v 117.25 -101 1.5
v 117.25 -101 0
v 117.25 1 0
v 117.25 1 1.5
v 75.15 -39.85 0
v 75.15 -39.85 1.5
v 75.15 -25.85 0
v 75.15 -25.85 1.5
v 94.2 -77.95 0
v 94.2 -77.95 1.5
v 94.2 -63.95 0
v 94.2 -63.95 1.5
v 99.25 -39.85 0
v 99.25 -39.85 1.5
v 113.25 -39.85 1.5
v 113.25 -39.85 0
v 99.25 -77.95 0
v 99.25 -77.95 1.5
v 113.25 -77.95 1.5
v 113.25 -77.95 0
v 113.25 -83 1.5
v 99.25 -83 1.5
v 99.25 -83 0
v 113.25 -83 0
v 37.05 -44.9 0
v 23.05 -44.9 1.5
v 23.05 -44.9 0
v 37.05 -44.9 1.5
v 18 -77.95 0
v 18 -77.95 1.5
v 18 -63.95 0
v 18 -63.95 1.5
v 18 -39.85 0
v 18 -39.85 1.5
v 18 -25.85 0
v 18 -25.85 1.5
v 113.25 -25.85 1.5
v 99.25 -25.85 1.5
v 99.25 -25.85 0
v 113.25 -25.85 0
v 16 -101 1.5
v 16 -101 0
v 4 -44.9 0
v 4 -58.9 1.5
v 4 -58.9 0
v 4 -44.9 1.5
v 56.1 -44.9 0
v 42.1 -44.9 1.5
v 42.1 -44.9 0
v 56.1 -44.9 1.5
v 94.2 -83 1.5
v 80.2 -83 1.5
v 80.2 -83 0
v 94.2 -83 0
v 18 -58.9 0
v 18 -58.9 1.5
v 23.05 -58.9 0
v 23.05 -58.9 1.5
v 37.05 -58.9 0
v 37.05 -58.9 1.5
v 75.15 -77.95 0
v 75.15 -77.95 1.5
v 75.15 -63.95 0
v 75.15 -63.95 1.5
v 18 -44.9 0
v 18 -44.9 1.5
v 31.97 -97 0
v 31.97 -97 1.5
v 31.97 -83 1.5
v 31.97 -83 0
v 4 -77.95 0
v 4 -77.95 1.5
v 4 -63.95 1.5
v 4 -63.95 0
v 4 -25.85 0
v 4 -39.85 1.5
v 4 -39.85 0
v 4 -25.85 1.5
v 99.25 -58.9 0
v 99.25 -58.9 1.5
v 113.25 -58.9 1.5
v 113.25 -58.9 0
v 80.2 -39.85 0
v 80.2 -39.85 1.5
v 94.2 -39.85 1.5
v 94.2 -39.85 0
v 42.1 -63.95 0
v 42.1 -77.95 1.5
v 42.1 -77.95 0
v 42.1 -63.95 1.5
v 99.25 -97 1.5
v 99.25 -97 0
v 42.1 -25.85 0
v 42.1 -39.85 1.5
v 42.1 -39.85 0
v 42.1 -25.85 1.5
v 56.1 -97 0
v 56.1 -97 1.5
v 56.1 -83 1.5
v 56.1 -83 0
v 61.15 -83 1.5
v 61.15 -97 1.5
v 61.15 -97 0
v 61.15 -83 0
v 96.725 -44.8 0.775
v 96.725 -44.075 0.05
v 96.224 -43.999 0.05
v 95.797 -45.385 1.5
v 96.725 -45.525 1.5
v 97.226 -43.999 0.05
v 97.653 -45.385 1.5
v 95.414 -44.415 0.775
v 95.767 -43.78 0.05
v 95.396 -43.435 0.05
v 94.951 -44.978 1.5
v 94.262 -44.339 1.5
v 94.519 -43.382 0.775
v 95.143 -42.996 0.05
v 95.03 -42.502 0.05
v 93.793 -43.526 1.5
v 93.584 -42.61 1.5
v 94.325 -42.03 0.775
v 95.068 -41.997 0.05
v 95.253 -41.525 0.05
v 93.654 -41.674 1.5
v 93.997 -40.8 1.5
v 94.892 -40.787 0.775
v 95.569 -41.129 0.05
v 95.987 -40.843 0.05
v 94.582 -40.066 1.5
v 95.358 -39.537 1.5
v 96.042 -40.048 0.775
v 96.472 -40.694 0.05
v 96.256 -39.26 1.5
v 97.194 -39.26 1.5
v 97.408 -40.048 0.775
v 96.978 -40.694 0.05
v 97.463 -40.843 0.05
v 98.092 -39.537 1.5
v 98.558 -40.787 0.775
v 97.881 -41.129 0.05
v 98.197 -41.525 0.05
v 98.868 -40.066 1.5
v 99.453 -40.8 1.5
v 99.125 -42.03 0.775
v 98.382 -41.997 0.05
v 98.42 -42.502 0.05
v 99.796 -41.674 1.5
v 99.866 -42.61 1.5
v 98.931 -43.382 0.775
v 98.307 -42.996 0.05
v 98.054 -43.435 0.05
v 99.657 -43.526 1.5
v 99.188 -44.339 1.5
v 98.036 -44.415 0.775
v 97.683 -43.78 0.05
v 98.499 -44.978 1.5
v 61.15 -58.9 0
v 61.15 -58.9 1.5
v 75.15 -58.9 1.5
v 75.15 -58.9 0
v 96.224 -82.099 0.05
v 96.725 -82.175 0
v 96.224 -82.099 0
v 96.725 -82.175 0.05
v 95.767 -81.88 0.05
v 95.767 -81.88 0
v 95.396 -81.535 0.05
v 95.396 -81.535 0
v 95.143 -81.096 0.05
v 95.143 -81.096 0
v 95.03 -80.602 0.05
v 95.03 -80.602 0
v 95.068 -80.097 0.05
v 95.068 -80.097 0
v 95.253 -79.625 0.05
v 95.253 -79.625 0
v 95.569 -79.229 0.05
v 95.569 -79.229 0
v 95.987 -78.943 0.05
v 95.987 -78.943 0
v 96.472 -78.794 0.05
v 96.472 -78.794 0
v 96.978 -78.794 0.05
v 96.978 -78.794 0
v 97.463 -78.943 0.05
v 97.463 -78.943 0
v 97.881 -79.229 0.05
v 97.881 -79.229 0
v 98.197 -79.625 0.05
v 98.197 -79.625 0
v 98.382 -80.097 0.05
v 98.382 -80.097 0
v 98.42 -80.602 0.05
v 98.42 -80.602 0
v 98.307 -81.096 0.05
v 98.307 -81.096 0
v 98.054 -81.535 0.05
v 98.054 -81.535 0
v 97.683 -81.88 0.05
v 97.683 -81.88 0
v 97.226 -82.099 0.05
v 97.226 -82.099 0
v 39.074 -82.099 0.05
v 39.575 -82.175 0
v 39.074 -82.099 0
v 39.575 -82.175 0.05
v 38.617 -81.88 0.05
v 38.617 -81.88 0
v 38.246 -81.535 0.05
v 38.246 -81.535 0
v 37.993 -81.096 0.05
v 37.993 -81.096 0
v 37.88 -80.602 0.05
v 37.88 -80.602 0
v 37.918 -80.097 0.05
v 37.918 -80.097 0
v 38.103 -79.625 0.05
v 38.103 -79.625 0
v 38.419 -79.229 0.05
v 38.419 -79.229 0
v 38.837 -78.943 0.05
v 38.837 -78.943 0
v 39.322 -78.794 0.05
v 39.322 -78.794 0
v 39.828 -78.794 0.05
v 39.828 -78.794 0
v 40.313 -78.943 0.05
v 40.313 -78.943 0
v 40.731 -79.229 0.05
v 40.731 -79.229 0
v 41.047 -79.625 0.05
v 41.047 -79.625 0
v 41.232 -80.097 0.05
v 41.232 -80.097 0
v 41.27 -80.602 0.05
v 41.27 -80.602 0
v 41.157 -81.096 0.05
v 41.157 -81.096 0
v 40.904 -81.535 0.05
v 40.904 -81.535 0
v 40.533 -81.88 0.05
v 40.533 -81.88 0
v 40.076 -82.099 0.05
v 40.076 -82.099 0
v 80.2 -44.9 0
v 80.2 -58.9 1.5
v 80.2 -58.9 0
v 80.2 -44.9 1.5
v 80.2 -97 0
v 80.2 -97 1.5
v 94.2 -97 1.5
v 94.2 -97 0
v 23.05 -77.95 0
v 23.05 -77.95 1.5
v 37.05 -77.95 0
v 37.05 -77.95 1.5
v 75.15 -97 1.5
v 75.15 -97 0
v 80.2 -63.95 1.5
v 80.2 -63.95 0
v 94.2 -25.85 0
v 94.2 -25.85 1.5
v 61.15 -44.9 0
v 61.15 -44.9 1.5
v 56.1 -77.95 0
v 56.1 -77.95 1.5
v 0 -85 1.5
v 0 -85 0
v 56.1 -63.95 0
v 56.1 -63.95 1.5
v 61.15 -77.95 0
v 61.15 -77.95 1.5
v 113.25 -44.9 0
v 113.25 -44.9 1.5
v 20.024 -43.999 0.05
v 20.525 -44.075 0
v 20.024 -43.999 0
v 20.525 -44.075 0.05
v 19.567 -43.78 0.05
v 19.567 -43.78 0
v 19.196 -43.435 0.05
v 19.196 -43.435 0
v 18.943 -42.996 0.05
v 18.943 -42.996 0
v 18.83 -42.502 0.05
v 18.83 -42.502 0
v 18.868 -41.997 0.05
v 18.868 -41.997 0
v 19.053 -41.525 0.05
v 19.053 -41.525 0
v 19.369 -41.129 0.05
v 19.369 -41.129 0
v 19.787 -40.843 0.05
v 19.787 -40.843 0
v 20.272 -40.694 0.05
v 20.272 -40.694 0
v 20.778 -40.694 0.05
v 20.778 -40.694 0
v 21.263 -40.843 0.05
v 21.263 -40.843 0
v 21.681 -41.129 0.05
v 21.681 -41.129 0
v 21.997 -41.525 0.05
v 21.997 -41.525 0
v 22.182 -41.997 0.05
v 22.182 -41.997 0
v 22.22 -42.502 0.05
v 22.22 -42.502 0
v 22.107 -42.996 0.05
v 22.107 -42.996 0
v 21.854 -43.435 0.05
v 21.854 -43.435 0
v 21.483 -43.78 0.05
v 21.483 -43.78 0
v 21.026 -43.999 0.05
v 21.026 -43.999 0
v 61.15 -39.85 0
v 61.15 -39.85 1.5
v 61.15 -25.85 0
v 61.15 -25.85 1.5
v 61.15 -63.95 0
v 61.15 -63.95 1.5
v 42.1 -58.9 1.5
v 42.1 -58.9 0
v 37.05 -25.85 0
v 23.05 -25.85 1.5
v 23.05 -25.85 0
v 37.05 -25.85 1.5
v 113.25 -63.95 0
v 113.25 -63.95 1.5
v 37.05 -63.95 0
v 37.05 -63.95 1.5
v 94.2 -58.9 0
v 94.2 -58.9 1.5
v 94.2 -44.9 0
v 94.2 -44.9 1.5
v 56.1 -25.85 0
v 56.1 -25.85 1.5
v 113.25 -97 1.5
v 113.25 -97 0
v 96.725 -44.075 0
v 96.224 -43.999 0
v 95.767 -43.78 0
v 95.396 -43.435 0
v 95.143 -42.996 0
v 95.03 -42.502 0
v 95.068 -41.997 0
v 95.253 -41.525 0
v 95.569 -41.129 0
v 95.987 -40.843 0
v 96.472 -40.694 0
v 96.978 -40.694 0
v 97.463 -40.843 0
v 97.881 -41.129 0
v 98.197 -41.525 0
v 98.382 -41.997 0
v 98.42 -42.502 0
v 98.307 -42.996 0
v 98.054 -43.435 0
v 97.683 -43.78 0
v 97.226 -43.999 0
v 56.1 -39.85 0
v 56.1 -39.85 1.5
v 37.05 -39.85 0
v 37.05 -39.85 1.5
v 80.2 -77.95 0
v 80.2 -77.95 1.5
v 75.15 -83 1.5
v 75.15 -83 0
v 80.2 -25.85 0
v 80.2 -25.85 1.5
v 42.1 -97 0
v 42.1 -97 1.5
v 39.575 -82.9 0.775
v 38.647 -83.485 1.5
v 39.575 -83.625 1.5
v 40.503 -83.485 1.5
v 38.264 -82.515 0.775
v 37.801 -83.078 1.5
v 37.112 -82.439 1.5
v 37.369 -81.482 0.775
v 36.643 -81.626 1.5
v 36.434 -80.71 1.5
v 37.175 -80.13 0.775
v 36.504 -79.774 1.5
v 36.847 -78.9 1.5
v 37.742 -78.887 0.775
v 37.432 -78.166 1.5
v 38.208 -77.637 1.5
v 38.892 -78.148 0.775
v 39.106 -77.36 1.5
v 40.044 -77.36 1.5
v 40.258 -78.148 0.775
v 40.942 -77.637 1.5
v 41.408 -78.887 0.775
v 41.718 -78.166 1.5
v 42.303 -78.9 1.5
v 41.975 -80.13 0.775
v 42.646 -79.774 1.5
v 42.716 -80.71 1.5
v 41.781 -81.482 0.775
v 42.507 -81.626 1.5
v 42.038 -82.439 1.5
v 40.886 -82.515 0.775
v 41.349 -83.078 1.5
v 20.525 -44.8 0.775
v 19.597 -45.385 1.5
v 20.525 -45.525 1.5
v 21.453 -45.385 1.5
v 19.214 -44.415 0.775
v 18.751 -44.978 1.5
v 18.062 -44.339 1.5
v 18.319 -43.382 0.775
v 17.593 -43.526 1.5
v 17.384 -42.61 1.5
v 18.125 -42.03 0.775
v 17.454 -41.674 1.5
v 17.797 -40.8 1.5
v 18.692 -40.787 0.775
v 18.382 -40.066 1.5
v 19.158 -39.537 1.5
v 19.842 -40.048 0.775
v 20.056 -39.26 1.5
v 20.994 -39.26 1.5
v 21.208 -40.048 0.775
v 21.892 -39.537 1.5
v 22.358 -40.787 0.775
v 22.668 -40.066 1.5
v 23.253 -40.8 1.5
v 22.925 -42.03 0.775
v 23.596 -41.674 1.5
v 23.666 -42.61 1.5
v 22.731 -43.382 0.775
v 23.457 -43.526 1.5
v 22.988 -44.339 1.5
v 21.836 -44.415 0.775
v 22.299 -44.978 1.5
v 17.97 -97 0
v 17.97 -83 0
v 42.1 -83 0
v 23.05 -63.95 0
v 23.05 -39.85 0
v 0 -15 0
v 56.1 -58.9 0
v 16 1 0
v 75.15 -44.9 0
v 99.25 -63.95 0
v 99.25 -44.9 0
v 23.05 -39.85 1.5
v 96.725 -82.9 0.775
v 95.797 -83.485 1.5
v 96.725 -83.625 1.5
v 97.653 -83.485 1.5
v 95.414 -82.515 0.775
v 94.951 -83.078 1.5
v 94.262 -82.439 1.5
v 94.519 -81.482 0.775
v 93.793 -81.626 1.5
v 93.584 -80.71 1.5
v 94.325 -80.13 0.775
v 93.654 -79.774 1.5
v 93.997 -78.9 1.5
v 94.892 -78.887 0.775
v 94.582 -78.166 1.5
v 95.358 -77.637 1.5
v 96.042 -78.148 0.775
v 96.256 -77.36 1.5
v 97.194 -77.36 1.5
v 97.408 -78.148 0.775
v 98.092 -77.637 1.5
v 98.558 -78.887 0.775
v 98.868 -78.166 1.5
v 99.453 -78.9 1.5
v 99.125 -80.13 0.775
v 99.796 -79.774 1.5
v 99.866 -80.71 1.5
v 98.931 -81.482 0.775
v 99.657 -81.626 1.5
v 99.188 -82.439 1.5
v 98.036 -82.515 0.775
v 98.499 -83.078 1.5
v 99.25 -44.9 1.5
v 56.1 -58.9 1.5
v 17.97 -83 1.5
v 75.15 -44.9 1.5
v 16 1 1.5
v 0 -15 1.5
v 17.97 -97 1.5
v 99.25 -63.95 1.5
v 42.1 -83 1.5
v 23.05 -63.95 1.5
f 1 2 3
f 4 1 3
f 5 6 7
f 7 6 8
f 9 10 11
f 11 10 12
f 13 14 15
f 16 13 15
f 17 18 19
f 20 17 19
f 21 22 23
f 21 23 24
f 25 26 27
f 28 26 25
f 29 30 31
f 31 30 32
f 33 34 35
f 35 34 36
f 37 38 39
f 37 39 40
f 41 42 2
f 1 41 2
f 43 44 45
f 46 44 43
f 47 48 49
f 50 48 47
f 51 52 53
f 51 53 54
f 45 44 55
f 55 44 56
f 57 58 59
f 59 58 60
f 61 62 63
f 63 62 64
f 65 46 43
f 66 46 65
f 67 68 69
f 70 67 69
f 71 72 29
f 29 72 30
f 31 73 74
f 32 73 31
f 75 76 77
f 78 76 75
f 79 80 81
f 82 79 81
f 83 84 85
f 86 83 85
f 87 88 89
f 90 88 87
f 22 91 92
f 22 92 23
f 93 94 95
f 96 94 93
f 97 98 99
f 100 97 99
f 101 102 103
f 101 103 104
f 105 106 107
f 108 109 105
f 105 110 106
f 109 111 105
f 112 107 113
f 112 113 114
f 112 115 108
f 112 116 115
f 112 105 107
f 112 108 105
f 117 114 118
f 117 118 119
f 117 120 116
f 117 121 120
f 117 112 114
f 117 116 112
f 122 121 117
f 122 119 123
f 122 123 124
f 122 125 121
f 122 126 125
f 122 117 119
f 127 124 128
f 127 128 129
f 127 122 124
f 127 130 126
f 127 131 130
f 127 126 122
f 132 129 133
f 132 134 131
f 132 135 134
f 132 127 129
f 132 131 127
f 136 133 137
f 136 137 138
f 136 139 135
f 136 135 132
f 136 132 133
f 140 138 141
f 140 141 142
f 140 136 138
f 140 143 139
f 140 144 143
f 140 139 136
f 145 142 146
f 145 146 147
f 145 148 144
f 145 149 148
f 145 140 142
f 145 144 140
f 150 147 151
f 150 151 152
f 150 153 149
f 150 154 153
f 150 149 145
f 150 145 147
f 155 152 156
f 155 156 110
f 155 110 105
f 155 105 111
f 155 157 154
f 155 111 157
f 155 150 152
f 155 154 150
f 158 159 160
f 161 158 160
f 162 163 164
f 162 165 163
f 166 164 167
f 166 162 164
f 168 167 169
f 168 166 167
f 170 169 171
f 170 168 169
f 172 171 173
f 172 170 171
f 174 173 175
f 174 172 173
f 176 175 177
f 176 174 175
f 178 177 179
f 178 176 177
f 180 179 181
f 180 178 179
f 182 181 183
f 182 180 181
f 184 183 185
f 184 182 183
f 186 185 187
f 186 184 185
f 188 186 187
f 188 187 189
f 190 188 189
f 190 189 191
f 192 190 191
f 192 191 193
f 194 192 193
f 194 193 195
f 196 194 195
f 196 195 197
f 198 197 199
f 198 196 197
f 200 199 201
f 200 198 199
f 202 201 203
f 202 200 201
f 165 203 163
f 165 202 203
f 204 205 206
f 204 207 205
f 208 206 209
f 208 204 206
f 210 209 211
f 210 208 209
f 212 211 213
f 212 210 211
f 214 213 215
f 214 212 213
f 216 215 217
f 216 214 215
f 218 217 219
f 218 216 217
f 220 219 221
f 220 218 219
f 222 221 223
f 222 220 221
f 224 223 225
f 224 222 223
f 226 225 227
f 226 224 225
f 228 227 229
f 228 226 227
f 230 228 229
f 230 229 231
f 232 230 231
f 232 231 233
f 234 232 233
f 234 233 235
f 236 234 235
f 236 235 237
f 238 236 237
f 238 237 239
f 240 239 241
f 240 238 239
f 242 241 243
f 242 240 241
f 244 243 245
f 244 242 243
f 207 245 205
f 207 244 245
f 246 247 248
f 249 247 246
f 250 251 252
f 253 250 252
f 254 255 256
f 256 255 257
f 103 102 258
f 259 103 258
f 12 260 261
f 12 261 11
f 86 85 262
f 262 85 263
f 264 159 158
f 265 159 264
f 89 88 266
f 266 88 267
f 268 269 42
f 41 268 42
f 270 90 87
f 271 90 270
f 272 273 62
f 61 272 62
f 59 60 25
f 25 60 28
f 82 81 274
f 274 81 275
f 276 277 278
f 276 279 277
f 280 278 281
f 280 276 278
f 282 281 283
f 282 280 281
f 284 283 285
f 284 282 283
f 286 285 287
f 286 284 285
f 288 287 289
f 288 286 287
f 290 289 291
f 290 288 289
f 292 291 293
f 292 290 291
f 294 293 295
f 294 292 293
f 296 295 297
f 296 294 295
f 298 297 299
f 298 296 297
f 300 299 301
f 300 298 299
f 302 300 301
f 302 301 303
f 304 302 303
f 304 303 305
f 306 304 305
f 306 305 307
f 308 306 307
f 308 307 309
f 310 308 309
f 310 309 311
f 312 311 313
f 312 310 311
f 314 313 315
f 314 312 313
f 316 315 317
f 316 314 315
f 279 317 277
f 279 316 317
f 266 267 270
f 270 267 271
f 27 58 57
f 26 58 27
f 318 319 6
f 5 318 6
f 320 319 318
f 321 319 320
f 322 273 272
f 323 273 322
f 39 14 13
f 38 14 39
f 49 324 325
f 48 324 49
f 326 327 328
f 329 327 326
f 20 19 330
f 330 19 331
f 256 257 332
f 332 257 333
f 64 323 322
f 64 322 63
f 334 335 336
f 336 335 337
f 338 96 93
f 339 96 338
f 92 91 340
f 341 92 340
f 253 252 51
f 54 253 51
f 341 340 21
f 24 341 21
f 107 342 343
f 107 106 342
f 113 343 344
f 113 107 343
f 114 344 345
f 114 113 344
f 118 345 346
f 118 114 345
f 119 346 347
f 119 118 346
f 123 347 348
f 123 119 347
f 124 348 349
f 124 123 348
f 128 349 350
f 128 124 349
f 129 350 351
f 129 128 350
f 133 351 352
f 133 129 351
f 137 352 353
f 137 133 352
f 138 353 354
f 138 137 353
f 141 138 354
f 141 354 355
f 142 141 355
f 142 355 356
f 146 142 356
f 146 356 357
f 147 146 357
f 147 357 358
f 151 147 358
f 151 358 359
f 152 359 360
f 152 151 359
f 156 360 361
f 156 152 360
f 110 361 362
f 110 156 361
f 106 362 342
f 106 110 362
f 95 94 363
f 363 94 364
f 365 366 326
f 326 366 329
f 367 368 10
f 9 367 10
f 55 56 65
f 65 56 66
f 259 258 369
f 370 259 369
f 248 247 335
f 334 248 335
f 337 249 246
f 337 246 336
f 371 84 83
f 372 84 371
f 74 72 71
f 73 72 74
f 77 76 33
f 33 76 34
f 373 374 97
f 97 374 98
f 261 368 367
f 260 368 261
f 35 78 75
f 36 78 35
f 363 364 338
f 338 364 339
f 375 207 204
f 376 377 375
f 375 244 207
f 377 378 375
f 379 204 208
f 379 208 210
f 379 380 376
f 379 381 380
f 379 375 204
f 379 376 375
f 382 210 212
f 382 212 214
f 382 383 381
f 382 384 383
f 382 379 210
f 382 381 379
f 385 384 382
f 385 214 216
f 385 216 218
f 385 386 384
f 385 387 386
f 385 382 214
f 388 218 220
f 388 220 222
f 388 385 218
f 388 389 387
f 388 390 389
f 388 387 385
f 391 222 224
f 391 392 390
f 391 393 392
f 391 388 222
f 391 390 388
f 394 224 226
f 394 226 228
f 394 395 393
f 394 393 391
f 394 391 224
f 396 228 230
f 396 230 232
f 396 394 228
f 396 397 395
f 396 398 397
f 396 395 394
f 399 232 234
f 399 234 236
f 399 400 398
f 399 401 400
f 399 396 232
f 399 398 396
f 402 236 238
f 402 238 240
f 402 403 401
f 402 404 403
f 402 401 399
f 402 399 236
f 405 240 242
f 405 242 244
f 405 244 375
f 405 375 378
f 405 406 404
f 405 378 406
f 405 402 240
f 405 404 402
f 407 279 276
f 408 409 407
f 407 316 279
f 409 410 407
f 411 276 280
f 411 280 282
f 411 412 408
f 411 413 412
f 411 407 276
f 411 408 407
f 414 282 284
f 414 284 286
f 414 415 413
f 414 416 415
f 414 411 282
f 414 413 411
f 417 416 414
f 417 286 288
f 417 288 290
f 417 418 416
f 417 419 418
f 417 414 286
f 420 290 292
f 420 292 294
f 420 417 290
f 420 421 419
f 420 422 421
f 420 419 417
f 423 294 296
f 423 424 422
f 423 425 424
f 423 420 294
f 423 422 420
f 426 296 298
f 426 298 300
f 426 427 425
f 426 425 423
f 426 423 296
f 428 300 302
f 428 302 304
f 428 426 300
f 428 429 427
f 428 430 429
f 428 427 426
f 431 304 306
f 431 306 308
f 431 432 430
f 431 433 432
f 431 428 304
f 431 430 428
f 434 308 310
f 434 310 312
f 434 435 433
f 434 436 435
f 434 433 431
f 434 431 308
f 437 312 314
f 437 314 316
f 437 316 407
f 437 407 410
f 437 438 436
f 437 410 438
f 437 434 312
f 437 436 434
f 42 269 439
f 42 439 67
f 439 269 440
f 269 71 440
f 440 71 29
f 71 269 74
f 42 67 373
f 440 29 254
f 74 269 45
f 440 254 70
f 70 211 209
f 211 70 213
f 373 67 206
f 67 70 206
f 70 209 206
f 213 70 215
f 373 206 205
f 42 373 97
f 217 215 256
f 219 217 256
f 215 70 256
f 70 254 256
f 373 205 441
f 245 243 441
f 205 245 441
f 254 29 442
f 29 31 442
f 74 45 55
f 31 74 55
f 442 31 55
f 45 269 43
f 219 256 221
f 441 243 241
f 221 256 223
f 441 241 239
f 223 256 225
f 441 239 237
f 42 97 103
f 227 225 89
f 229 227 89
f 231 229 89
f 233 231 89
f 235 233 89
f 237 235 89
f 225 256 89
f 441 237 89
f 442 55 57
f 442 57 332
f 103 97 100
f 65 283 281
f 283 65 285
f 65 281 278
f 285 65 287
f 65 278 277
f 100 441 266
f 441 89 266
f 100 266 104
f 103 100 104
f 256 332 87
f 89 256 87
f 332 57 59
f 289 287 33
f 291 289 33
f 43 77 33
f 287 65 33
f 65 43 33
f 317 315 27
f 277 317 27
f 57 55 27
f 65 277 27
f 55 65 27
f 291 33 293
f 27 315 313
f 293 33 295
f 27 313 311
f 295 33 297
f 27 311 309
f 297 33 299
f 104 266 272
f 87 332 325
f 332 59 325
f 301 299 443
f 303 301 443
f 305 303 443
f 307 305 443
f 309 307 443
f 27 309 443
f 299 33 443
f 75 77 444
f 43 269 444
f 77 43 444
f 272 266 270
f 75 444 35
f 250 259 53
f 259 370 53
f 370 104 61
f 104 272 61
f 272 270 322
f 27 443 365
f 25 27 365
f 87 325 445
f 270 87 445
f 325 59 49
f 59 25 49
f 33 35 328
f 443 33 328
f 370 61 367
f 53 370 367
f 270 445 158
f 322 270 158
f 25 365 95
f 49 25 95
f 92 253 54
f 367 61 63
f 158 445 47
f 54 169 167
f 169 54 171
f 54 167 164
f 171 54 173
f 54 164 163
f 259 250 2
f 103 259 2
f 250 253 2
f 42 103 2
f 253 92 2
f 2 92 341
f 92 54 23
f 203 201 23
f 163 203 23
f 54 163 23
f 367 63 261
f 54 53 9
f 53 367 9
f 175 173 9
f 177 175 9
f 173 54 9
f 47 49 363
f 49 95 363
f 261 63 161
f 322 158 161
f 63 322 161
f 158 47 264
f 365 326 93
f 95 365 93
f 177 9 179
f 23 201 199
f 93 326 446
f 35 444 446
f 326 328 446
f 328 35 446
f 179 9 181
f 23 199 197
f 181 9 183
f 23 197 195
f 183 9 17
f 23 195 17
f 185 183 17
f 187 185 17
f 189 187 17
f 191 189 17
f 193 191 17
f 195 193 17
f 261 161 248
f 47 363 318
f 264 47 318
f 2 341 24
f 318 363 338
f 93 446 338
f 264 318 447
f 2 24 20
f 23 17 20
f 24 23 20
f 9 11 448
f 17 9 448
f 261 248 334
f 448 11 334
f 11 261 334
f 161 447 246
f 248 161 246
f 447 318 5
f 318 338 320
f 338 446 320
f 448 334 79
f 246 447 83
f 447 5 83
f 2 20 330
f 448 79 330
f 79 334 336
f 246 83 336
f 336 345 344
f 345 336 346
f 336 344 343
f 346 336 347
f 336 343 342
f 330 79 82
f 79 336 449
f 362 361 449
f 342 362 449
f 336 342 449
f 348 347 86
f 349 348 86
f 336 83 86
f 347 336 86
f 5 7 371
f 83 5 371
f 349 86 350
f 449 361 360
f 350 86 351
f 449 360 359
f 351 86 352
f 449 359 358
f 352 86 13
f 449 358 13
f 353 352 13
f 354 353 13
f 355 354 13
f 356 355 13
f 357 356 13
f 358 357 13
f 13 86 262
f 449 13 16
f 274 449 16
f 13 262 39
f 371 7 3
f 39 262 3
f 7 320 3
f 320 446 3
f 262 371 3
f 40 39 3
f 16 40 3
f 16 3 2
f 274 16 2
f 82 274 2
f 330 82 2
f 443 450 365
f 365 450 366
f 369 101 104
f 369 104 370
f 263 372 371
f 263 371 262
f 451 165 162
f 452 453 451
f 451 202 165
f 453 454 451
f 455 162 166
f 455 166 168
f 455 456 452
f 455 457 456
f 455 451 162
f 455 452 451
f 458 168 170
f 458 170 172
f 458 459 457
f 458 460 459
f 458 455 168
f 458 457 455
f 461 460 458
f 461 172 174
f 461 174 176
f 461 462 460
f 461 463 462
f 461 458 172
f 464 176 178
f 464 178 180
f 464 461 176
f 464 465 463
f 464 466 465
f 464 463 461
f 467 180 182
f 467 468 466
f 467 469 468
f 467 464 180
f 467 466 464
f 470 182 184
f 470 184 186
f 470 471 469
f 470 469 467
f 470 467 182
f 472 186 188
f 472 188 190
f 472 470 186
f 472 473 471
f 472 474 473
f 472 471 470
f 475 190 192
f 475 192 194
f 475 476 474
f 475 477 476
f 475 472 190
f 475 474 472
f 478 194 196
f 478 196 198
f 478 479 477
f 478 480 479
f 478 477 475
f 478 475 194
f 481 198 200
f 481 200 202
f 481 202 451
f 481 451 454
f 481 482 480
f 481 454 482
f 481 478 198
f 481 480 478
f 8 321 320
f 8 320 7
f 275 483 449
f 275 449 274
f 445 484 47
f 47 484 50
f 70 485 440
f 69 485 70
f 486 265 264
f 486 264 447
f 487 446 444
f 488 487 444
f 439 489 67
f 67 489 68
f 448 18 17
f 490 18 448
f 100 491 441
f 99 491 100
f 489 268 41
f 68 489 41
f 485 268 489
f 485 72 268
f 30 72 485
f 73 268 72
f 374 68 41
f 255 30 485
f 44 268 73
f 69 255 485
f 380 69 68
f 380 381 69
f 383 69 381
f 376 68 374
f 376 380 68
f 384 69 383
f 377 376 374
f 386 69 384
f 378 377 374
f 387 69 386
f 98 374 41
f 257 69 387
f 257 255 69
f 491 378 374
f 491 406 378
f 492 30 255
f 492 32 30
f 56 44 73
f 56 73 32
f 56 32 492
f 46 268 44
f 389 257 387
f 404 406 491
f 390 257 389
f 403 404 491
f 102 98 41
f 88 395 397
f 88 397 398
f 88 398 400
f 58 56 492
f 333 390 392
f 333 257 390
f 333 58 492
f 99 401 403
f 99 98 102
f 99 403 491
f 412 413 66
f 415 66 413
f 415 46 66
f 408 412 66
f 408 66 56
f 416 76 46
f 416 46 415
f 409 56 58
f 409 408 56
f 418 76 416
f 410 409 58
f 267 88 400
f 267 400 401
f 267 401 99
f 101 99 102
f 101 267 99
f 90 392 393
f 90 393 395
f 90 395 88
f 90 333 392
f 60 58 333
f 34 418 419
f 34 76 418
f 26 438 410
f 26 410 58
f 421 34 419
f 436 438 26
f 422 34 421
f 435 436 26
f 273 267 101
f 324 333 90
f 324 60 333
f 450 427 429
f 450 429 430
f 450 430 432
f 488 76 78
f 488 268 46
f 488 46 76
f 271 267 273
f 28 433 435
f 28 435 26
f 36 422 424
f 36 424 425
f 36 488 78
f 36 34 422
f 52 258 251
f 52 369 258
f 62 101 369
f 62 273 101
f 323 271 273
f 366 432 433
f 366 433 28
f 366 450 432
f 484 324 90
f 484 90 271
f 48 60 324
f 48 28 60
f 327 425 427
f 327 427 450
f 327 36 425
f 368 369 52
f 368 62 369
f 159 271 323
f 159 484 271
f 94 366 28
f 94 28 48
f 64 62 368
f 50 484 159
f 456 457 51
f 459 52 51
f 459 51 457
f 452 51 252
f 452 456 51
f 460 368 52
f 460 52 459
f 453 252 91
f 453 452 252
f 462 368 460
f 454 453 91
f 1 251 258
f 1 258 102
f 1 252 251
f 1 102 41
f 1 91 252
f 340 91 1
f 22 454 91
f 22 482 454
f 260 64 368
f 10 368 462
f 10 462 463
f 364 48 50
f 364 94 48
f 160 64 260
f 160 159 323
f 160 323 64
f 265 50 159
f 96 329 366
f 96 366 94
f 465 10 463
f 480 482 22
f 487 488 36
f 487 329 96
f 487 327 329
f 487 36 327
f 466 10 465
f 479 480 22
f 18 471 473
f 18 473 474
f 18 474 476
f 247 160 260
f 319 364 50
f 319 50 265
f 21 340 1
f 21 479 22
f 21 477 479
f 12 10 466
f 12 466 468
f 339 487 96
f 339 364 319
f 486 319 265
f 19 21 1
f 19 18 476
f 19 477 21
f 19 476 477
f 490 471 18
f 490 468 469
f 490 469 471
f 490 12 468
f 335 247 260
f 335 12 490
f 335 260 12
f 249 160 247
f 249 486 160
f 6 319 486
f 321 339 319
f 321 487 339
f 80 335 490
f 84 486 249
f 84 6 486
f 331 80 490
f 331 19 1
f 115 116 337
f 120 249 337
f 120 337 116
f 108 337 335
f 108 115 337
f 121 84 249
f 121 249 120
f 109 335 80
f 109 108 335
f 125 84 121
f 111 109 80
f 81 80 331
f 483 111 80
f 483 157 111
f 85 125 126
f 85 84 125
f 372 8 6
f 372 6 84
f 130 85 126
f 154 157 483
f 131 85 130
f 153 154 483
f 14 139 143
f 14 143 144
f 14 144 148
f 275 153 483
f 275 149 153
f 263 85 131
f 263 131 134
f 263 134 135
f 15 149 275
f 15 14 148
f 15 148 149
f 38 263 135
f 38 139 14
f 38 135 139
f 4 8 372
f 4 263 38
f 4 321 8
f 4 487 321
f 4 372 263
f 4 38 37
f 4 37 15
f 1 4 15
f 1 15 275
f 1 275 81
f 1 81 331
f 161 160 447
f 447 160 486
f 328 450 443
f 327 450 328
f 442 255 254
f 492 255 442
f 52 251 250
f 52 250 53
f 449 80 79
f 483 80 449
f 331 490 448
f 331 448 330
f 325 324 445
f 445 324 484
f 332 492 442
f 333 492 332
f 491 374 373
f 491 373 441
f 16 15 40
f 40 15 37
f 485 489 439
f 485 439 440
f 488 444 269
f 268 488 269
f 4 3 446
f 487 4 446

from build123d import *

# Parameters (mm, degrees)
BOSS_EXTRU_1_DEPTH                          = 1.5
ESQUISSE2_W                                 = 14
ESQUISSE2_H                                 = 14
ENL_V_MAT_EXTRU_1_DEPTH                     = 1.5
FRAISAGE_POUR_VIS_T_TE_FRAIS_E_M31_AT_COUNT = 2
FRAISAGE_POUR_VIS_T_TE_FRAIS_E_M31_AT_PITCH = 76.2
FRAISAGE_POUR_VIS_T_TE_FRAIS_E_M31_2_COUNT  = 2
FRAISAGE_POUR_VIS_T_TE_FRAIS_E_M31_2_PITCH  = 85.194189943
FRAISAGE_POUR_VIS_T_TE_FRAIS_E_M31_3_COUNT  = 2
FRAISAGE_POUR_VIS_T_TE_FRAIS_E_M31_3_PITCH  = 42.597094971


with BuildPart() as part:
    # Esquisse1 → Boss.-Extru.1 (new body)
    with BuildSketch(Plane.XY):
        Polygon((0, -85), (16, -101), (117.25, -101), (117.25, 1), (16, 1), (0, -15), align=None)
    extrude(amount=BOSS_EXTRU_1_DEPTH)

    # Esquisse2 → Enlèv. mat.-Extru.1 (cut)
    with BuildSketch(Plane.XY.offset(1.5)):
        with Locations((11, -32.85)):
            Rectangle(ESQUISSE2_W, ESQUISSE2_H)
        with Locations((30.05, -32.85)):
            Rectangle(ESQUISSE2_W, ESQUISSE2_H)
        with Locations((49.1, -32.85)):
            Rectangle(ESQUISSE2_W, ESQUISSE2_H)
        with Locations((68.15, -32.85)):
            Rectangle(ESQUISSE2_W, ESQUISSE2_H)
        with Locations((87.2, -32.85)):
            Rectangle(ESQUISSE2_W, ESQUISSE2_H)
        with Locations((106.25, -32.85)):
            Rectangle(ESQUISSE2_W, ESQUISSE2_H)
        with Locations((30.05, -51.9)):
            Rectangle(ESQUISSE2_W, ESQUISSE2_H)
        with Locations((49.1, -51.9)):
            Rectangle(ESQUISSE2_W, ESQUISSE2_H)
        with Locations((68.15, -51.9)):
            Rectangle(ESQUISSE2_W, ESQUISSE2_H)
        with Locations((87.2, -51.9)):
            Rectangle(ESQUISSE2_W, ESQUISSE2_H)
        with Locations((106.25, -51.9)):
            Rectangle(ESQUISSE2_W, ESQUISSE2_H)
        with Locations((30.05, -70.95)):
            Rectangle(ESQUISSE2_W, ESQUISSE2_H)
        with Locations((49.1, -70.95)):
            Rectangle(ESQUISSE2_W, ESQUISSE2_H)
        with Locations((68.15, -70.95)):
            Rectangle(ESQUISSE2_W, ESQUISSE2_H)
        with Locations((87.2, -70.95)):
            Rectangle(ESQUISSE2_W, ESQUISSE2_H)
        with Locations((106.25, -70.95)):
            Rectangle(ESQUISSE2_W, ESQUISSE2_H)
        with Locations((11, -51.9)):
            Rectangle(ESQUISSE2_W, ESQUISSE2_H)
        with Locations((11, -70.95)):
            Rectangle(ESQUISSE2_W, ESQUISSE2_H)
        with Locations((49.1, -90)):
            Rectangle(ESQUISSE2_W, ESQUISSE2_H)
        with Locations((68.15, -90)):
            Rectangle(ESQUISSE2_W, ESQUISSE2_H)
        with Locations((87.2, -90)):
            Rectangle(ESQUISSE2_W, ESQUISSE2_H)
        with Locations((106.25, -90)):
            Rectangle(ESQUISSE2_W, ESQUISSE2_H)
        with Locations((24.97, -90)):
            Rectangle(ESQUISSE2_W, ESQUISSE2_H)
    extrude(amount=-ENL_V_MAT_EXTRU_1_DEPTH, mode=Mode.SUBTRACT)

    # Esquisse18 → Fraisage pour vis à tête fraisée M31 (revolve, cut)
    with BuildSketch(Plane(origin=(20.525, -42.375, 1.5), x_dir=(0, -1, 0), z_dir=(1, 0, 0))):
        Polygon((0, 0), (0, 1.5), (1.7, 1.5), (1.7, 1.45), (3.15, 0), align=None)
    fraisage_pour_vis_t_te_frais_e_m31 = revolve(axis=Axis((20.525, -42.375, 7.85), (0, 0, -1)), mode=Mode.SUBTRACT)

    # Fraisage pour vis à tête fraisée M31 at: Fraisage pour vis à tête fraisée M31 ×2
    with Locations(*[(i * FRAISAGE_POUR_VIS_T_TE_FRAIS_E_M31_AT_PITCH, 0, 0) for i in range(1, FRAISAGE_POUR_VIS_T_TE_FRAIS_E_M31_AT_COUNT)]):
        add(fraisage_pour_vis_t_te_frais_e_m31, mode=Mode.SUBTRACT)

    # Fraisage pour vis _ t_te frais_e M31 2: Fraisage pour vis à tête fraisée M31 ×2
    with Locations(*[Vector(0.894427191, -0.447213595, 0) * (i * FRAISAGE_POUR_VIS_T_TE_FRAIS_E_M31_2_PITCH) for i in range(1, FRAISAGE_POUR_VIS_T_TE_FRAIS_E_M31_2_COUNT)]):
        add(fraisage_pour_vis_t_te_frais_e_m31, mode=Mode.SUBTRACT)

    # Fraisage pour vis _ t_te frais_e M31 3: Fraisage pour vis à tête fraisée M31 ×2
    with Locations(*[Vector(0.447213596, -0.894427191, 0) * (i * FRAISAGE_POUR_VIS_T_TE_FRAIS_E_M31_3_PITCH) for i in range(1, FRAISAGE_POUR_VIS_T_TE_FRAIS_E_M31_3_COUNT)]):
        add(fraisage_pour_vis_t_te_frais_e_m31, mode=Mode.SUBTRACT)


solid = part.part
